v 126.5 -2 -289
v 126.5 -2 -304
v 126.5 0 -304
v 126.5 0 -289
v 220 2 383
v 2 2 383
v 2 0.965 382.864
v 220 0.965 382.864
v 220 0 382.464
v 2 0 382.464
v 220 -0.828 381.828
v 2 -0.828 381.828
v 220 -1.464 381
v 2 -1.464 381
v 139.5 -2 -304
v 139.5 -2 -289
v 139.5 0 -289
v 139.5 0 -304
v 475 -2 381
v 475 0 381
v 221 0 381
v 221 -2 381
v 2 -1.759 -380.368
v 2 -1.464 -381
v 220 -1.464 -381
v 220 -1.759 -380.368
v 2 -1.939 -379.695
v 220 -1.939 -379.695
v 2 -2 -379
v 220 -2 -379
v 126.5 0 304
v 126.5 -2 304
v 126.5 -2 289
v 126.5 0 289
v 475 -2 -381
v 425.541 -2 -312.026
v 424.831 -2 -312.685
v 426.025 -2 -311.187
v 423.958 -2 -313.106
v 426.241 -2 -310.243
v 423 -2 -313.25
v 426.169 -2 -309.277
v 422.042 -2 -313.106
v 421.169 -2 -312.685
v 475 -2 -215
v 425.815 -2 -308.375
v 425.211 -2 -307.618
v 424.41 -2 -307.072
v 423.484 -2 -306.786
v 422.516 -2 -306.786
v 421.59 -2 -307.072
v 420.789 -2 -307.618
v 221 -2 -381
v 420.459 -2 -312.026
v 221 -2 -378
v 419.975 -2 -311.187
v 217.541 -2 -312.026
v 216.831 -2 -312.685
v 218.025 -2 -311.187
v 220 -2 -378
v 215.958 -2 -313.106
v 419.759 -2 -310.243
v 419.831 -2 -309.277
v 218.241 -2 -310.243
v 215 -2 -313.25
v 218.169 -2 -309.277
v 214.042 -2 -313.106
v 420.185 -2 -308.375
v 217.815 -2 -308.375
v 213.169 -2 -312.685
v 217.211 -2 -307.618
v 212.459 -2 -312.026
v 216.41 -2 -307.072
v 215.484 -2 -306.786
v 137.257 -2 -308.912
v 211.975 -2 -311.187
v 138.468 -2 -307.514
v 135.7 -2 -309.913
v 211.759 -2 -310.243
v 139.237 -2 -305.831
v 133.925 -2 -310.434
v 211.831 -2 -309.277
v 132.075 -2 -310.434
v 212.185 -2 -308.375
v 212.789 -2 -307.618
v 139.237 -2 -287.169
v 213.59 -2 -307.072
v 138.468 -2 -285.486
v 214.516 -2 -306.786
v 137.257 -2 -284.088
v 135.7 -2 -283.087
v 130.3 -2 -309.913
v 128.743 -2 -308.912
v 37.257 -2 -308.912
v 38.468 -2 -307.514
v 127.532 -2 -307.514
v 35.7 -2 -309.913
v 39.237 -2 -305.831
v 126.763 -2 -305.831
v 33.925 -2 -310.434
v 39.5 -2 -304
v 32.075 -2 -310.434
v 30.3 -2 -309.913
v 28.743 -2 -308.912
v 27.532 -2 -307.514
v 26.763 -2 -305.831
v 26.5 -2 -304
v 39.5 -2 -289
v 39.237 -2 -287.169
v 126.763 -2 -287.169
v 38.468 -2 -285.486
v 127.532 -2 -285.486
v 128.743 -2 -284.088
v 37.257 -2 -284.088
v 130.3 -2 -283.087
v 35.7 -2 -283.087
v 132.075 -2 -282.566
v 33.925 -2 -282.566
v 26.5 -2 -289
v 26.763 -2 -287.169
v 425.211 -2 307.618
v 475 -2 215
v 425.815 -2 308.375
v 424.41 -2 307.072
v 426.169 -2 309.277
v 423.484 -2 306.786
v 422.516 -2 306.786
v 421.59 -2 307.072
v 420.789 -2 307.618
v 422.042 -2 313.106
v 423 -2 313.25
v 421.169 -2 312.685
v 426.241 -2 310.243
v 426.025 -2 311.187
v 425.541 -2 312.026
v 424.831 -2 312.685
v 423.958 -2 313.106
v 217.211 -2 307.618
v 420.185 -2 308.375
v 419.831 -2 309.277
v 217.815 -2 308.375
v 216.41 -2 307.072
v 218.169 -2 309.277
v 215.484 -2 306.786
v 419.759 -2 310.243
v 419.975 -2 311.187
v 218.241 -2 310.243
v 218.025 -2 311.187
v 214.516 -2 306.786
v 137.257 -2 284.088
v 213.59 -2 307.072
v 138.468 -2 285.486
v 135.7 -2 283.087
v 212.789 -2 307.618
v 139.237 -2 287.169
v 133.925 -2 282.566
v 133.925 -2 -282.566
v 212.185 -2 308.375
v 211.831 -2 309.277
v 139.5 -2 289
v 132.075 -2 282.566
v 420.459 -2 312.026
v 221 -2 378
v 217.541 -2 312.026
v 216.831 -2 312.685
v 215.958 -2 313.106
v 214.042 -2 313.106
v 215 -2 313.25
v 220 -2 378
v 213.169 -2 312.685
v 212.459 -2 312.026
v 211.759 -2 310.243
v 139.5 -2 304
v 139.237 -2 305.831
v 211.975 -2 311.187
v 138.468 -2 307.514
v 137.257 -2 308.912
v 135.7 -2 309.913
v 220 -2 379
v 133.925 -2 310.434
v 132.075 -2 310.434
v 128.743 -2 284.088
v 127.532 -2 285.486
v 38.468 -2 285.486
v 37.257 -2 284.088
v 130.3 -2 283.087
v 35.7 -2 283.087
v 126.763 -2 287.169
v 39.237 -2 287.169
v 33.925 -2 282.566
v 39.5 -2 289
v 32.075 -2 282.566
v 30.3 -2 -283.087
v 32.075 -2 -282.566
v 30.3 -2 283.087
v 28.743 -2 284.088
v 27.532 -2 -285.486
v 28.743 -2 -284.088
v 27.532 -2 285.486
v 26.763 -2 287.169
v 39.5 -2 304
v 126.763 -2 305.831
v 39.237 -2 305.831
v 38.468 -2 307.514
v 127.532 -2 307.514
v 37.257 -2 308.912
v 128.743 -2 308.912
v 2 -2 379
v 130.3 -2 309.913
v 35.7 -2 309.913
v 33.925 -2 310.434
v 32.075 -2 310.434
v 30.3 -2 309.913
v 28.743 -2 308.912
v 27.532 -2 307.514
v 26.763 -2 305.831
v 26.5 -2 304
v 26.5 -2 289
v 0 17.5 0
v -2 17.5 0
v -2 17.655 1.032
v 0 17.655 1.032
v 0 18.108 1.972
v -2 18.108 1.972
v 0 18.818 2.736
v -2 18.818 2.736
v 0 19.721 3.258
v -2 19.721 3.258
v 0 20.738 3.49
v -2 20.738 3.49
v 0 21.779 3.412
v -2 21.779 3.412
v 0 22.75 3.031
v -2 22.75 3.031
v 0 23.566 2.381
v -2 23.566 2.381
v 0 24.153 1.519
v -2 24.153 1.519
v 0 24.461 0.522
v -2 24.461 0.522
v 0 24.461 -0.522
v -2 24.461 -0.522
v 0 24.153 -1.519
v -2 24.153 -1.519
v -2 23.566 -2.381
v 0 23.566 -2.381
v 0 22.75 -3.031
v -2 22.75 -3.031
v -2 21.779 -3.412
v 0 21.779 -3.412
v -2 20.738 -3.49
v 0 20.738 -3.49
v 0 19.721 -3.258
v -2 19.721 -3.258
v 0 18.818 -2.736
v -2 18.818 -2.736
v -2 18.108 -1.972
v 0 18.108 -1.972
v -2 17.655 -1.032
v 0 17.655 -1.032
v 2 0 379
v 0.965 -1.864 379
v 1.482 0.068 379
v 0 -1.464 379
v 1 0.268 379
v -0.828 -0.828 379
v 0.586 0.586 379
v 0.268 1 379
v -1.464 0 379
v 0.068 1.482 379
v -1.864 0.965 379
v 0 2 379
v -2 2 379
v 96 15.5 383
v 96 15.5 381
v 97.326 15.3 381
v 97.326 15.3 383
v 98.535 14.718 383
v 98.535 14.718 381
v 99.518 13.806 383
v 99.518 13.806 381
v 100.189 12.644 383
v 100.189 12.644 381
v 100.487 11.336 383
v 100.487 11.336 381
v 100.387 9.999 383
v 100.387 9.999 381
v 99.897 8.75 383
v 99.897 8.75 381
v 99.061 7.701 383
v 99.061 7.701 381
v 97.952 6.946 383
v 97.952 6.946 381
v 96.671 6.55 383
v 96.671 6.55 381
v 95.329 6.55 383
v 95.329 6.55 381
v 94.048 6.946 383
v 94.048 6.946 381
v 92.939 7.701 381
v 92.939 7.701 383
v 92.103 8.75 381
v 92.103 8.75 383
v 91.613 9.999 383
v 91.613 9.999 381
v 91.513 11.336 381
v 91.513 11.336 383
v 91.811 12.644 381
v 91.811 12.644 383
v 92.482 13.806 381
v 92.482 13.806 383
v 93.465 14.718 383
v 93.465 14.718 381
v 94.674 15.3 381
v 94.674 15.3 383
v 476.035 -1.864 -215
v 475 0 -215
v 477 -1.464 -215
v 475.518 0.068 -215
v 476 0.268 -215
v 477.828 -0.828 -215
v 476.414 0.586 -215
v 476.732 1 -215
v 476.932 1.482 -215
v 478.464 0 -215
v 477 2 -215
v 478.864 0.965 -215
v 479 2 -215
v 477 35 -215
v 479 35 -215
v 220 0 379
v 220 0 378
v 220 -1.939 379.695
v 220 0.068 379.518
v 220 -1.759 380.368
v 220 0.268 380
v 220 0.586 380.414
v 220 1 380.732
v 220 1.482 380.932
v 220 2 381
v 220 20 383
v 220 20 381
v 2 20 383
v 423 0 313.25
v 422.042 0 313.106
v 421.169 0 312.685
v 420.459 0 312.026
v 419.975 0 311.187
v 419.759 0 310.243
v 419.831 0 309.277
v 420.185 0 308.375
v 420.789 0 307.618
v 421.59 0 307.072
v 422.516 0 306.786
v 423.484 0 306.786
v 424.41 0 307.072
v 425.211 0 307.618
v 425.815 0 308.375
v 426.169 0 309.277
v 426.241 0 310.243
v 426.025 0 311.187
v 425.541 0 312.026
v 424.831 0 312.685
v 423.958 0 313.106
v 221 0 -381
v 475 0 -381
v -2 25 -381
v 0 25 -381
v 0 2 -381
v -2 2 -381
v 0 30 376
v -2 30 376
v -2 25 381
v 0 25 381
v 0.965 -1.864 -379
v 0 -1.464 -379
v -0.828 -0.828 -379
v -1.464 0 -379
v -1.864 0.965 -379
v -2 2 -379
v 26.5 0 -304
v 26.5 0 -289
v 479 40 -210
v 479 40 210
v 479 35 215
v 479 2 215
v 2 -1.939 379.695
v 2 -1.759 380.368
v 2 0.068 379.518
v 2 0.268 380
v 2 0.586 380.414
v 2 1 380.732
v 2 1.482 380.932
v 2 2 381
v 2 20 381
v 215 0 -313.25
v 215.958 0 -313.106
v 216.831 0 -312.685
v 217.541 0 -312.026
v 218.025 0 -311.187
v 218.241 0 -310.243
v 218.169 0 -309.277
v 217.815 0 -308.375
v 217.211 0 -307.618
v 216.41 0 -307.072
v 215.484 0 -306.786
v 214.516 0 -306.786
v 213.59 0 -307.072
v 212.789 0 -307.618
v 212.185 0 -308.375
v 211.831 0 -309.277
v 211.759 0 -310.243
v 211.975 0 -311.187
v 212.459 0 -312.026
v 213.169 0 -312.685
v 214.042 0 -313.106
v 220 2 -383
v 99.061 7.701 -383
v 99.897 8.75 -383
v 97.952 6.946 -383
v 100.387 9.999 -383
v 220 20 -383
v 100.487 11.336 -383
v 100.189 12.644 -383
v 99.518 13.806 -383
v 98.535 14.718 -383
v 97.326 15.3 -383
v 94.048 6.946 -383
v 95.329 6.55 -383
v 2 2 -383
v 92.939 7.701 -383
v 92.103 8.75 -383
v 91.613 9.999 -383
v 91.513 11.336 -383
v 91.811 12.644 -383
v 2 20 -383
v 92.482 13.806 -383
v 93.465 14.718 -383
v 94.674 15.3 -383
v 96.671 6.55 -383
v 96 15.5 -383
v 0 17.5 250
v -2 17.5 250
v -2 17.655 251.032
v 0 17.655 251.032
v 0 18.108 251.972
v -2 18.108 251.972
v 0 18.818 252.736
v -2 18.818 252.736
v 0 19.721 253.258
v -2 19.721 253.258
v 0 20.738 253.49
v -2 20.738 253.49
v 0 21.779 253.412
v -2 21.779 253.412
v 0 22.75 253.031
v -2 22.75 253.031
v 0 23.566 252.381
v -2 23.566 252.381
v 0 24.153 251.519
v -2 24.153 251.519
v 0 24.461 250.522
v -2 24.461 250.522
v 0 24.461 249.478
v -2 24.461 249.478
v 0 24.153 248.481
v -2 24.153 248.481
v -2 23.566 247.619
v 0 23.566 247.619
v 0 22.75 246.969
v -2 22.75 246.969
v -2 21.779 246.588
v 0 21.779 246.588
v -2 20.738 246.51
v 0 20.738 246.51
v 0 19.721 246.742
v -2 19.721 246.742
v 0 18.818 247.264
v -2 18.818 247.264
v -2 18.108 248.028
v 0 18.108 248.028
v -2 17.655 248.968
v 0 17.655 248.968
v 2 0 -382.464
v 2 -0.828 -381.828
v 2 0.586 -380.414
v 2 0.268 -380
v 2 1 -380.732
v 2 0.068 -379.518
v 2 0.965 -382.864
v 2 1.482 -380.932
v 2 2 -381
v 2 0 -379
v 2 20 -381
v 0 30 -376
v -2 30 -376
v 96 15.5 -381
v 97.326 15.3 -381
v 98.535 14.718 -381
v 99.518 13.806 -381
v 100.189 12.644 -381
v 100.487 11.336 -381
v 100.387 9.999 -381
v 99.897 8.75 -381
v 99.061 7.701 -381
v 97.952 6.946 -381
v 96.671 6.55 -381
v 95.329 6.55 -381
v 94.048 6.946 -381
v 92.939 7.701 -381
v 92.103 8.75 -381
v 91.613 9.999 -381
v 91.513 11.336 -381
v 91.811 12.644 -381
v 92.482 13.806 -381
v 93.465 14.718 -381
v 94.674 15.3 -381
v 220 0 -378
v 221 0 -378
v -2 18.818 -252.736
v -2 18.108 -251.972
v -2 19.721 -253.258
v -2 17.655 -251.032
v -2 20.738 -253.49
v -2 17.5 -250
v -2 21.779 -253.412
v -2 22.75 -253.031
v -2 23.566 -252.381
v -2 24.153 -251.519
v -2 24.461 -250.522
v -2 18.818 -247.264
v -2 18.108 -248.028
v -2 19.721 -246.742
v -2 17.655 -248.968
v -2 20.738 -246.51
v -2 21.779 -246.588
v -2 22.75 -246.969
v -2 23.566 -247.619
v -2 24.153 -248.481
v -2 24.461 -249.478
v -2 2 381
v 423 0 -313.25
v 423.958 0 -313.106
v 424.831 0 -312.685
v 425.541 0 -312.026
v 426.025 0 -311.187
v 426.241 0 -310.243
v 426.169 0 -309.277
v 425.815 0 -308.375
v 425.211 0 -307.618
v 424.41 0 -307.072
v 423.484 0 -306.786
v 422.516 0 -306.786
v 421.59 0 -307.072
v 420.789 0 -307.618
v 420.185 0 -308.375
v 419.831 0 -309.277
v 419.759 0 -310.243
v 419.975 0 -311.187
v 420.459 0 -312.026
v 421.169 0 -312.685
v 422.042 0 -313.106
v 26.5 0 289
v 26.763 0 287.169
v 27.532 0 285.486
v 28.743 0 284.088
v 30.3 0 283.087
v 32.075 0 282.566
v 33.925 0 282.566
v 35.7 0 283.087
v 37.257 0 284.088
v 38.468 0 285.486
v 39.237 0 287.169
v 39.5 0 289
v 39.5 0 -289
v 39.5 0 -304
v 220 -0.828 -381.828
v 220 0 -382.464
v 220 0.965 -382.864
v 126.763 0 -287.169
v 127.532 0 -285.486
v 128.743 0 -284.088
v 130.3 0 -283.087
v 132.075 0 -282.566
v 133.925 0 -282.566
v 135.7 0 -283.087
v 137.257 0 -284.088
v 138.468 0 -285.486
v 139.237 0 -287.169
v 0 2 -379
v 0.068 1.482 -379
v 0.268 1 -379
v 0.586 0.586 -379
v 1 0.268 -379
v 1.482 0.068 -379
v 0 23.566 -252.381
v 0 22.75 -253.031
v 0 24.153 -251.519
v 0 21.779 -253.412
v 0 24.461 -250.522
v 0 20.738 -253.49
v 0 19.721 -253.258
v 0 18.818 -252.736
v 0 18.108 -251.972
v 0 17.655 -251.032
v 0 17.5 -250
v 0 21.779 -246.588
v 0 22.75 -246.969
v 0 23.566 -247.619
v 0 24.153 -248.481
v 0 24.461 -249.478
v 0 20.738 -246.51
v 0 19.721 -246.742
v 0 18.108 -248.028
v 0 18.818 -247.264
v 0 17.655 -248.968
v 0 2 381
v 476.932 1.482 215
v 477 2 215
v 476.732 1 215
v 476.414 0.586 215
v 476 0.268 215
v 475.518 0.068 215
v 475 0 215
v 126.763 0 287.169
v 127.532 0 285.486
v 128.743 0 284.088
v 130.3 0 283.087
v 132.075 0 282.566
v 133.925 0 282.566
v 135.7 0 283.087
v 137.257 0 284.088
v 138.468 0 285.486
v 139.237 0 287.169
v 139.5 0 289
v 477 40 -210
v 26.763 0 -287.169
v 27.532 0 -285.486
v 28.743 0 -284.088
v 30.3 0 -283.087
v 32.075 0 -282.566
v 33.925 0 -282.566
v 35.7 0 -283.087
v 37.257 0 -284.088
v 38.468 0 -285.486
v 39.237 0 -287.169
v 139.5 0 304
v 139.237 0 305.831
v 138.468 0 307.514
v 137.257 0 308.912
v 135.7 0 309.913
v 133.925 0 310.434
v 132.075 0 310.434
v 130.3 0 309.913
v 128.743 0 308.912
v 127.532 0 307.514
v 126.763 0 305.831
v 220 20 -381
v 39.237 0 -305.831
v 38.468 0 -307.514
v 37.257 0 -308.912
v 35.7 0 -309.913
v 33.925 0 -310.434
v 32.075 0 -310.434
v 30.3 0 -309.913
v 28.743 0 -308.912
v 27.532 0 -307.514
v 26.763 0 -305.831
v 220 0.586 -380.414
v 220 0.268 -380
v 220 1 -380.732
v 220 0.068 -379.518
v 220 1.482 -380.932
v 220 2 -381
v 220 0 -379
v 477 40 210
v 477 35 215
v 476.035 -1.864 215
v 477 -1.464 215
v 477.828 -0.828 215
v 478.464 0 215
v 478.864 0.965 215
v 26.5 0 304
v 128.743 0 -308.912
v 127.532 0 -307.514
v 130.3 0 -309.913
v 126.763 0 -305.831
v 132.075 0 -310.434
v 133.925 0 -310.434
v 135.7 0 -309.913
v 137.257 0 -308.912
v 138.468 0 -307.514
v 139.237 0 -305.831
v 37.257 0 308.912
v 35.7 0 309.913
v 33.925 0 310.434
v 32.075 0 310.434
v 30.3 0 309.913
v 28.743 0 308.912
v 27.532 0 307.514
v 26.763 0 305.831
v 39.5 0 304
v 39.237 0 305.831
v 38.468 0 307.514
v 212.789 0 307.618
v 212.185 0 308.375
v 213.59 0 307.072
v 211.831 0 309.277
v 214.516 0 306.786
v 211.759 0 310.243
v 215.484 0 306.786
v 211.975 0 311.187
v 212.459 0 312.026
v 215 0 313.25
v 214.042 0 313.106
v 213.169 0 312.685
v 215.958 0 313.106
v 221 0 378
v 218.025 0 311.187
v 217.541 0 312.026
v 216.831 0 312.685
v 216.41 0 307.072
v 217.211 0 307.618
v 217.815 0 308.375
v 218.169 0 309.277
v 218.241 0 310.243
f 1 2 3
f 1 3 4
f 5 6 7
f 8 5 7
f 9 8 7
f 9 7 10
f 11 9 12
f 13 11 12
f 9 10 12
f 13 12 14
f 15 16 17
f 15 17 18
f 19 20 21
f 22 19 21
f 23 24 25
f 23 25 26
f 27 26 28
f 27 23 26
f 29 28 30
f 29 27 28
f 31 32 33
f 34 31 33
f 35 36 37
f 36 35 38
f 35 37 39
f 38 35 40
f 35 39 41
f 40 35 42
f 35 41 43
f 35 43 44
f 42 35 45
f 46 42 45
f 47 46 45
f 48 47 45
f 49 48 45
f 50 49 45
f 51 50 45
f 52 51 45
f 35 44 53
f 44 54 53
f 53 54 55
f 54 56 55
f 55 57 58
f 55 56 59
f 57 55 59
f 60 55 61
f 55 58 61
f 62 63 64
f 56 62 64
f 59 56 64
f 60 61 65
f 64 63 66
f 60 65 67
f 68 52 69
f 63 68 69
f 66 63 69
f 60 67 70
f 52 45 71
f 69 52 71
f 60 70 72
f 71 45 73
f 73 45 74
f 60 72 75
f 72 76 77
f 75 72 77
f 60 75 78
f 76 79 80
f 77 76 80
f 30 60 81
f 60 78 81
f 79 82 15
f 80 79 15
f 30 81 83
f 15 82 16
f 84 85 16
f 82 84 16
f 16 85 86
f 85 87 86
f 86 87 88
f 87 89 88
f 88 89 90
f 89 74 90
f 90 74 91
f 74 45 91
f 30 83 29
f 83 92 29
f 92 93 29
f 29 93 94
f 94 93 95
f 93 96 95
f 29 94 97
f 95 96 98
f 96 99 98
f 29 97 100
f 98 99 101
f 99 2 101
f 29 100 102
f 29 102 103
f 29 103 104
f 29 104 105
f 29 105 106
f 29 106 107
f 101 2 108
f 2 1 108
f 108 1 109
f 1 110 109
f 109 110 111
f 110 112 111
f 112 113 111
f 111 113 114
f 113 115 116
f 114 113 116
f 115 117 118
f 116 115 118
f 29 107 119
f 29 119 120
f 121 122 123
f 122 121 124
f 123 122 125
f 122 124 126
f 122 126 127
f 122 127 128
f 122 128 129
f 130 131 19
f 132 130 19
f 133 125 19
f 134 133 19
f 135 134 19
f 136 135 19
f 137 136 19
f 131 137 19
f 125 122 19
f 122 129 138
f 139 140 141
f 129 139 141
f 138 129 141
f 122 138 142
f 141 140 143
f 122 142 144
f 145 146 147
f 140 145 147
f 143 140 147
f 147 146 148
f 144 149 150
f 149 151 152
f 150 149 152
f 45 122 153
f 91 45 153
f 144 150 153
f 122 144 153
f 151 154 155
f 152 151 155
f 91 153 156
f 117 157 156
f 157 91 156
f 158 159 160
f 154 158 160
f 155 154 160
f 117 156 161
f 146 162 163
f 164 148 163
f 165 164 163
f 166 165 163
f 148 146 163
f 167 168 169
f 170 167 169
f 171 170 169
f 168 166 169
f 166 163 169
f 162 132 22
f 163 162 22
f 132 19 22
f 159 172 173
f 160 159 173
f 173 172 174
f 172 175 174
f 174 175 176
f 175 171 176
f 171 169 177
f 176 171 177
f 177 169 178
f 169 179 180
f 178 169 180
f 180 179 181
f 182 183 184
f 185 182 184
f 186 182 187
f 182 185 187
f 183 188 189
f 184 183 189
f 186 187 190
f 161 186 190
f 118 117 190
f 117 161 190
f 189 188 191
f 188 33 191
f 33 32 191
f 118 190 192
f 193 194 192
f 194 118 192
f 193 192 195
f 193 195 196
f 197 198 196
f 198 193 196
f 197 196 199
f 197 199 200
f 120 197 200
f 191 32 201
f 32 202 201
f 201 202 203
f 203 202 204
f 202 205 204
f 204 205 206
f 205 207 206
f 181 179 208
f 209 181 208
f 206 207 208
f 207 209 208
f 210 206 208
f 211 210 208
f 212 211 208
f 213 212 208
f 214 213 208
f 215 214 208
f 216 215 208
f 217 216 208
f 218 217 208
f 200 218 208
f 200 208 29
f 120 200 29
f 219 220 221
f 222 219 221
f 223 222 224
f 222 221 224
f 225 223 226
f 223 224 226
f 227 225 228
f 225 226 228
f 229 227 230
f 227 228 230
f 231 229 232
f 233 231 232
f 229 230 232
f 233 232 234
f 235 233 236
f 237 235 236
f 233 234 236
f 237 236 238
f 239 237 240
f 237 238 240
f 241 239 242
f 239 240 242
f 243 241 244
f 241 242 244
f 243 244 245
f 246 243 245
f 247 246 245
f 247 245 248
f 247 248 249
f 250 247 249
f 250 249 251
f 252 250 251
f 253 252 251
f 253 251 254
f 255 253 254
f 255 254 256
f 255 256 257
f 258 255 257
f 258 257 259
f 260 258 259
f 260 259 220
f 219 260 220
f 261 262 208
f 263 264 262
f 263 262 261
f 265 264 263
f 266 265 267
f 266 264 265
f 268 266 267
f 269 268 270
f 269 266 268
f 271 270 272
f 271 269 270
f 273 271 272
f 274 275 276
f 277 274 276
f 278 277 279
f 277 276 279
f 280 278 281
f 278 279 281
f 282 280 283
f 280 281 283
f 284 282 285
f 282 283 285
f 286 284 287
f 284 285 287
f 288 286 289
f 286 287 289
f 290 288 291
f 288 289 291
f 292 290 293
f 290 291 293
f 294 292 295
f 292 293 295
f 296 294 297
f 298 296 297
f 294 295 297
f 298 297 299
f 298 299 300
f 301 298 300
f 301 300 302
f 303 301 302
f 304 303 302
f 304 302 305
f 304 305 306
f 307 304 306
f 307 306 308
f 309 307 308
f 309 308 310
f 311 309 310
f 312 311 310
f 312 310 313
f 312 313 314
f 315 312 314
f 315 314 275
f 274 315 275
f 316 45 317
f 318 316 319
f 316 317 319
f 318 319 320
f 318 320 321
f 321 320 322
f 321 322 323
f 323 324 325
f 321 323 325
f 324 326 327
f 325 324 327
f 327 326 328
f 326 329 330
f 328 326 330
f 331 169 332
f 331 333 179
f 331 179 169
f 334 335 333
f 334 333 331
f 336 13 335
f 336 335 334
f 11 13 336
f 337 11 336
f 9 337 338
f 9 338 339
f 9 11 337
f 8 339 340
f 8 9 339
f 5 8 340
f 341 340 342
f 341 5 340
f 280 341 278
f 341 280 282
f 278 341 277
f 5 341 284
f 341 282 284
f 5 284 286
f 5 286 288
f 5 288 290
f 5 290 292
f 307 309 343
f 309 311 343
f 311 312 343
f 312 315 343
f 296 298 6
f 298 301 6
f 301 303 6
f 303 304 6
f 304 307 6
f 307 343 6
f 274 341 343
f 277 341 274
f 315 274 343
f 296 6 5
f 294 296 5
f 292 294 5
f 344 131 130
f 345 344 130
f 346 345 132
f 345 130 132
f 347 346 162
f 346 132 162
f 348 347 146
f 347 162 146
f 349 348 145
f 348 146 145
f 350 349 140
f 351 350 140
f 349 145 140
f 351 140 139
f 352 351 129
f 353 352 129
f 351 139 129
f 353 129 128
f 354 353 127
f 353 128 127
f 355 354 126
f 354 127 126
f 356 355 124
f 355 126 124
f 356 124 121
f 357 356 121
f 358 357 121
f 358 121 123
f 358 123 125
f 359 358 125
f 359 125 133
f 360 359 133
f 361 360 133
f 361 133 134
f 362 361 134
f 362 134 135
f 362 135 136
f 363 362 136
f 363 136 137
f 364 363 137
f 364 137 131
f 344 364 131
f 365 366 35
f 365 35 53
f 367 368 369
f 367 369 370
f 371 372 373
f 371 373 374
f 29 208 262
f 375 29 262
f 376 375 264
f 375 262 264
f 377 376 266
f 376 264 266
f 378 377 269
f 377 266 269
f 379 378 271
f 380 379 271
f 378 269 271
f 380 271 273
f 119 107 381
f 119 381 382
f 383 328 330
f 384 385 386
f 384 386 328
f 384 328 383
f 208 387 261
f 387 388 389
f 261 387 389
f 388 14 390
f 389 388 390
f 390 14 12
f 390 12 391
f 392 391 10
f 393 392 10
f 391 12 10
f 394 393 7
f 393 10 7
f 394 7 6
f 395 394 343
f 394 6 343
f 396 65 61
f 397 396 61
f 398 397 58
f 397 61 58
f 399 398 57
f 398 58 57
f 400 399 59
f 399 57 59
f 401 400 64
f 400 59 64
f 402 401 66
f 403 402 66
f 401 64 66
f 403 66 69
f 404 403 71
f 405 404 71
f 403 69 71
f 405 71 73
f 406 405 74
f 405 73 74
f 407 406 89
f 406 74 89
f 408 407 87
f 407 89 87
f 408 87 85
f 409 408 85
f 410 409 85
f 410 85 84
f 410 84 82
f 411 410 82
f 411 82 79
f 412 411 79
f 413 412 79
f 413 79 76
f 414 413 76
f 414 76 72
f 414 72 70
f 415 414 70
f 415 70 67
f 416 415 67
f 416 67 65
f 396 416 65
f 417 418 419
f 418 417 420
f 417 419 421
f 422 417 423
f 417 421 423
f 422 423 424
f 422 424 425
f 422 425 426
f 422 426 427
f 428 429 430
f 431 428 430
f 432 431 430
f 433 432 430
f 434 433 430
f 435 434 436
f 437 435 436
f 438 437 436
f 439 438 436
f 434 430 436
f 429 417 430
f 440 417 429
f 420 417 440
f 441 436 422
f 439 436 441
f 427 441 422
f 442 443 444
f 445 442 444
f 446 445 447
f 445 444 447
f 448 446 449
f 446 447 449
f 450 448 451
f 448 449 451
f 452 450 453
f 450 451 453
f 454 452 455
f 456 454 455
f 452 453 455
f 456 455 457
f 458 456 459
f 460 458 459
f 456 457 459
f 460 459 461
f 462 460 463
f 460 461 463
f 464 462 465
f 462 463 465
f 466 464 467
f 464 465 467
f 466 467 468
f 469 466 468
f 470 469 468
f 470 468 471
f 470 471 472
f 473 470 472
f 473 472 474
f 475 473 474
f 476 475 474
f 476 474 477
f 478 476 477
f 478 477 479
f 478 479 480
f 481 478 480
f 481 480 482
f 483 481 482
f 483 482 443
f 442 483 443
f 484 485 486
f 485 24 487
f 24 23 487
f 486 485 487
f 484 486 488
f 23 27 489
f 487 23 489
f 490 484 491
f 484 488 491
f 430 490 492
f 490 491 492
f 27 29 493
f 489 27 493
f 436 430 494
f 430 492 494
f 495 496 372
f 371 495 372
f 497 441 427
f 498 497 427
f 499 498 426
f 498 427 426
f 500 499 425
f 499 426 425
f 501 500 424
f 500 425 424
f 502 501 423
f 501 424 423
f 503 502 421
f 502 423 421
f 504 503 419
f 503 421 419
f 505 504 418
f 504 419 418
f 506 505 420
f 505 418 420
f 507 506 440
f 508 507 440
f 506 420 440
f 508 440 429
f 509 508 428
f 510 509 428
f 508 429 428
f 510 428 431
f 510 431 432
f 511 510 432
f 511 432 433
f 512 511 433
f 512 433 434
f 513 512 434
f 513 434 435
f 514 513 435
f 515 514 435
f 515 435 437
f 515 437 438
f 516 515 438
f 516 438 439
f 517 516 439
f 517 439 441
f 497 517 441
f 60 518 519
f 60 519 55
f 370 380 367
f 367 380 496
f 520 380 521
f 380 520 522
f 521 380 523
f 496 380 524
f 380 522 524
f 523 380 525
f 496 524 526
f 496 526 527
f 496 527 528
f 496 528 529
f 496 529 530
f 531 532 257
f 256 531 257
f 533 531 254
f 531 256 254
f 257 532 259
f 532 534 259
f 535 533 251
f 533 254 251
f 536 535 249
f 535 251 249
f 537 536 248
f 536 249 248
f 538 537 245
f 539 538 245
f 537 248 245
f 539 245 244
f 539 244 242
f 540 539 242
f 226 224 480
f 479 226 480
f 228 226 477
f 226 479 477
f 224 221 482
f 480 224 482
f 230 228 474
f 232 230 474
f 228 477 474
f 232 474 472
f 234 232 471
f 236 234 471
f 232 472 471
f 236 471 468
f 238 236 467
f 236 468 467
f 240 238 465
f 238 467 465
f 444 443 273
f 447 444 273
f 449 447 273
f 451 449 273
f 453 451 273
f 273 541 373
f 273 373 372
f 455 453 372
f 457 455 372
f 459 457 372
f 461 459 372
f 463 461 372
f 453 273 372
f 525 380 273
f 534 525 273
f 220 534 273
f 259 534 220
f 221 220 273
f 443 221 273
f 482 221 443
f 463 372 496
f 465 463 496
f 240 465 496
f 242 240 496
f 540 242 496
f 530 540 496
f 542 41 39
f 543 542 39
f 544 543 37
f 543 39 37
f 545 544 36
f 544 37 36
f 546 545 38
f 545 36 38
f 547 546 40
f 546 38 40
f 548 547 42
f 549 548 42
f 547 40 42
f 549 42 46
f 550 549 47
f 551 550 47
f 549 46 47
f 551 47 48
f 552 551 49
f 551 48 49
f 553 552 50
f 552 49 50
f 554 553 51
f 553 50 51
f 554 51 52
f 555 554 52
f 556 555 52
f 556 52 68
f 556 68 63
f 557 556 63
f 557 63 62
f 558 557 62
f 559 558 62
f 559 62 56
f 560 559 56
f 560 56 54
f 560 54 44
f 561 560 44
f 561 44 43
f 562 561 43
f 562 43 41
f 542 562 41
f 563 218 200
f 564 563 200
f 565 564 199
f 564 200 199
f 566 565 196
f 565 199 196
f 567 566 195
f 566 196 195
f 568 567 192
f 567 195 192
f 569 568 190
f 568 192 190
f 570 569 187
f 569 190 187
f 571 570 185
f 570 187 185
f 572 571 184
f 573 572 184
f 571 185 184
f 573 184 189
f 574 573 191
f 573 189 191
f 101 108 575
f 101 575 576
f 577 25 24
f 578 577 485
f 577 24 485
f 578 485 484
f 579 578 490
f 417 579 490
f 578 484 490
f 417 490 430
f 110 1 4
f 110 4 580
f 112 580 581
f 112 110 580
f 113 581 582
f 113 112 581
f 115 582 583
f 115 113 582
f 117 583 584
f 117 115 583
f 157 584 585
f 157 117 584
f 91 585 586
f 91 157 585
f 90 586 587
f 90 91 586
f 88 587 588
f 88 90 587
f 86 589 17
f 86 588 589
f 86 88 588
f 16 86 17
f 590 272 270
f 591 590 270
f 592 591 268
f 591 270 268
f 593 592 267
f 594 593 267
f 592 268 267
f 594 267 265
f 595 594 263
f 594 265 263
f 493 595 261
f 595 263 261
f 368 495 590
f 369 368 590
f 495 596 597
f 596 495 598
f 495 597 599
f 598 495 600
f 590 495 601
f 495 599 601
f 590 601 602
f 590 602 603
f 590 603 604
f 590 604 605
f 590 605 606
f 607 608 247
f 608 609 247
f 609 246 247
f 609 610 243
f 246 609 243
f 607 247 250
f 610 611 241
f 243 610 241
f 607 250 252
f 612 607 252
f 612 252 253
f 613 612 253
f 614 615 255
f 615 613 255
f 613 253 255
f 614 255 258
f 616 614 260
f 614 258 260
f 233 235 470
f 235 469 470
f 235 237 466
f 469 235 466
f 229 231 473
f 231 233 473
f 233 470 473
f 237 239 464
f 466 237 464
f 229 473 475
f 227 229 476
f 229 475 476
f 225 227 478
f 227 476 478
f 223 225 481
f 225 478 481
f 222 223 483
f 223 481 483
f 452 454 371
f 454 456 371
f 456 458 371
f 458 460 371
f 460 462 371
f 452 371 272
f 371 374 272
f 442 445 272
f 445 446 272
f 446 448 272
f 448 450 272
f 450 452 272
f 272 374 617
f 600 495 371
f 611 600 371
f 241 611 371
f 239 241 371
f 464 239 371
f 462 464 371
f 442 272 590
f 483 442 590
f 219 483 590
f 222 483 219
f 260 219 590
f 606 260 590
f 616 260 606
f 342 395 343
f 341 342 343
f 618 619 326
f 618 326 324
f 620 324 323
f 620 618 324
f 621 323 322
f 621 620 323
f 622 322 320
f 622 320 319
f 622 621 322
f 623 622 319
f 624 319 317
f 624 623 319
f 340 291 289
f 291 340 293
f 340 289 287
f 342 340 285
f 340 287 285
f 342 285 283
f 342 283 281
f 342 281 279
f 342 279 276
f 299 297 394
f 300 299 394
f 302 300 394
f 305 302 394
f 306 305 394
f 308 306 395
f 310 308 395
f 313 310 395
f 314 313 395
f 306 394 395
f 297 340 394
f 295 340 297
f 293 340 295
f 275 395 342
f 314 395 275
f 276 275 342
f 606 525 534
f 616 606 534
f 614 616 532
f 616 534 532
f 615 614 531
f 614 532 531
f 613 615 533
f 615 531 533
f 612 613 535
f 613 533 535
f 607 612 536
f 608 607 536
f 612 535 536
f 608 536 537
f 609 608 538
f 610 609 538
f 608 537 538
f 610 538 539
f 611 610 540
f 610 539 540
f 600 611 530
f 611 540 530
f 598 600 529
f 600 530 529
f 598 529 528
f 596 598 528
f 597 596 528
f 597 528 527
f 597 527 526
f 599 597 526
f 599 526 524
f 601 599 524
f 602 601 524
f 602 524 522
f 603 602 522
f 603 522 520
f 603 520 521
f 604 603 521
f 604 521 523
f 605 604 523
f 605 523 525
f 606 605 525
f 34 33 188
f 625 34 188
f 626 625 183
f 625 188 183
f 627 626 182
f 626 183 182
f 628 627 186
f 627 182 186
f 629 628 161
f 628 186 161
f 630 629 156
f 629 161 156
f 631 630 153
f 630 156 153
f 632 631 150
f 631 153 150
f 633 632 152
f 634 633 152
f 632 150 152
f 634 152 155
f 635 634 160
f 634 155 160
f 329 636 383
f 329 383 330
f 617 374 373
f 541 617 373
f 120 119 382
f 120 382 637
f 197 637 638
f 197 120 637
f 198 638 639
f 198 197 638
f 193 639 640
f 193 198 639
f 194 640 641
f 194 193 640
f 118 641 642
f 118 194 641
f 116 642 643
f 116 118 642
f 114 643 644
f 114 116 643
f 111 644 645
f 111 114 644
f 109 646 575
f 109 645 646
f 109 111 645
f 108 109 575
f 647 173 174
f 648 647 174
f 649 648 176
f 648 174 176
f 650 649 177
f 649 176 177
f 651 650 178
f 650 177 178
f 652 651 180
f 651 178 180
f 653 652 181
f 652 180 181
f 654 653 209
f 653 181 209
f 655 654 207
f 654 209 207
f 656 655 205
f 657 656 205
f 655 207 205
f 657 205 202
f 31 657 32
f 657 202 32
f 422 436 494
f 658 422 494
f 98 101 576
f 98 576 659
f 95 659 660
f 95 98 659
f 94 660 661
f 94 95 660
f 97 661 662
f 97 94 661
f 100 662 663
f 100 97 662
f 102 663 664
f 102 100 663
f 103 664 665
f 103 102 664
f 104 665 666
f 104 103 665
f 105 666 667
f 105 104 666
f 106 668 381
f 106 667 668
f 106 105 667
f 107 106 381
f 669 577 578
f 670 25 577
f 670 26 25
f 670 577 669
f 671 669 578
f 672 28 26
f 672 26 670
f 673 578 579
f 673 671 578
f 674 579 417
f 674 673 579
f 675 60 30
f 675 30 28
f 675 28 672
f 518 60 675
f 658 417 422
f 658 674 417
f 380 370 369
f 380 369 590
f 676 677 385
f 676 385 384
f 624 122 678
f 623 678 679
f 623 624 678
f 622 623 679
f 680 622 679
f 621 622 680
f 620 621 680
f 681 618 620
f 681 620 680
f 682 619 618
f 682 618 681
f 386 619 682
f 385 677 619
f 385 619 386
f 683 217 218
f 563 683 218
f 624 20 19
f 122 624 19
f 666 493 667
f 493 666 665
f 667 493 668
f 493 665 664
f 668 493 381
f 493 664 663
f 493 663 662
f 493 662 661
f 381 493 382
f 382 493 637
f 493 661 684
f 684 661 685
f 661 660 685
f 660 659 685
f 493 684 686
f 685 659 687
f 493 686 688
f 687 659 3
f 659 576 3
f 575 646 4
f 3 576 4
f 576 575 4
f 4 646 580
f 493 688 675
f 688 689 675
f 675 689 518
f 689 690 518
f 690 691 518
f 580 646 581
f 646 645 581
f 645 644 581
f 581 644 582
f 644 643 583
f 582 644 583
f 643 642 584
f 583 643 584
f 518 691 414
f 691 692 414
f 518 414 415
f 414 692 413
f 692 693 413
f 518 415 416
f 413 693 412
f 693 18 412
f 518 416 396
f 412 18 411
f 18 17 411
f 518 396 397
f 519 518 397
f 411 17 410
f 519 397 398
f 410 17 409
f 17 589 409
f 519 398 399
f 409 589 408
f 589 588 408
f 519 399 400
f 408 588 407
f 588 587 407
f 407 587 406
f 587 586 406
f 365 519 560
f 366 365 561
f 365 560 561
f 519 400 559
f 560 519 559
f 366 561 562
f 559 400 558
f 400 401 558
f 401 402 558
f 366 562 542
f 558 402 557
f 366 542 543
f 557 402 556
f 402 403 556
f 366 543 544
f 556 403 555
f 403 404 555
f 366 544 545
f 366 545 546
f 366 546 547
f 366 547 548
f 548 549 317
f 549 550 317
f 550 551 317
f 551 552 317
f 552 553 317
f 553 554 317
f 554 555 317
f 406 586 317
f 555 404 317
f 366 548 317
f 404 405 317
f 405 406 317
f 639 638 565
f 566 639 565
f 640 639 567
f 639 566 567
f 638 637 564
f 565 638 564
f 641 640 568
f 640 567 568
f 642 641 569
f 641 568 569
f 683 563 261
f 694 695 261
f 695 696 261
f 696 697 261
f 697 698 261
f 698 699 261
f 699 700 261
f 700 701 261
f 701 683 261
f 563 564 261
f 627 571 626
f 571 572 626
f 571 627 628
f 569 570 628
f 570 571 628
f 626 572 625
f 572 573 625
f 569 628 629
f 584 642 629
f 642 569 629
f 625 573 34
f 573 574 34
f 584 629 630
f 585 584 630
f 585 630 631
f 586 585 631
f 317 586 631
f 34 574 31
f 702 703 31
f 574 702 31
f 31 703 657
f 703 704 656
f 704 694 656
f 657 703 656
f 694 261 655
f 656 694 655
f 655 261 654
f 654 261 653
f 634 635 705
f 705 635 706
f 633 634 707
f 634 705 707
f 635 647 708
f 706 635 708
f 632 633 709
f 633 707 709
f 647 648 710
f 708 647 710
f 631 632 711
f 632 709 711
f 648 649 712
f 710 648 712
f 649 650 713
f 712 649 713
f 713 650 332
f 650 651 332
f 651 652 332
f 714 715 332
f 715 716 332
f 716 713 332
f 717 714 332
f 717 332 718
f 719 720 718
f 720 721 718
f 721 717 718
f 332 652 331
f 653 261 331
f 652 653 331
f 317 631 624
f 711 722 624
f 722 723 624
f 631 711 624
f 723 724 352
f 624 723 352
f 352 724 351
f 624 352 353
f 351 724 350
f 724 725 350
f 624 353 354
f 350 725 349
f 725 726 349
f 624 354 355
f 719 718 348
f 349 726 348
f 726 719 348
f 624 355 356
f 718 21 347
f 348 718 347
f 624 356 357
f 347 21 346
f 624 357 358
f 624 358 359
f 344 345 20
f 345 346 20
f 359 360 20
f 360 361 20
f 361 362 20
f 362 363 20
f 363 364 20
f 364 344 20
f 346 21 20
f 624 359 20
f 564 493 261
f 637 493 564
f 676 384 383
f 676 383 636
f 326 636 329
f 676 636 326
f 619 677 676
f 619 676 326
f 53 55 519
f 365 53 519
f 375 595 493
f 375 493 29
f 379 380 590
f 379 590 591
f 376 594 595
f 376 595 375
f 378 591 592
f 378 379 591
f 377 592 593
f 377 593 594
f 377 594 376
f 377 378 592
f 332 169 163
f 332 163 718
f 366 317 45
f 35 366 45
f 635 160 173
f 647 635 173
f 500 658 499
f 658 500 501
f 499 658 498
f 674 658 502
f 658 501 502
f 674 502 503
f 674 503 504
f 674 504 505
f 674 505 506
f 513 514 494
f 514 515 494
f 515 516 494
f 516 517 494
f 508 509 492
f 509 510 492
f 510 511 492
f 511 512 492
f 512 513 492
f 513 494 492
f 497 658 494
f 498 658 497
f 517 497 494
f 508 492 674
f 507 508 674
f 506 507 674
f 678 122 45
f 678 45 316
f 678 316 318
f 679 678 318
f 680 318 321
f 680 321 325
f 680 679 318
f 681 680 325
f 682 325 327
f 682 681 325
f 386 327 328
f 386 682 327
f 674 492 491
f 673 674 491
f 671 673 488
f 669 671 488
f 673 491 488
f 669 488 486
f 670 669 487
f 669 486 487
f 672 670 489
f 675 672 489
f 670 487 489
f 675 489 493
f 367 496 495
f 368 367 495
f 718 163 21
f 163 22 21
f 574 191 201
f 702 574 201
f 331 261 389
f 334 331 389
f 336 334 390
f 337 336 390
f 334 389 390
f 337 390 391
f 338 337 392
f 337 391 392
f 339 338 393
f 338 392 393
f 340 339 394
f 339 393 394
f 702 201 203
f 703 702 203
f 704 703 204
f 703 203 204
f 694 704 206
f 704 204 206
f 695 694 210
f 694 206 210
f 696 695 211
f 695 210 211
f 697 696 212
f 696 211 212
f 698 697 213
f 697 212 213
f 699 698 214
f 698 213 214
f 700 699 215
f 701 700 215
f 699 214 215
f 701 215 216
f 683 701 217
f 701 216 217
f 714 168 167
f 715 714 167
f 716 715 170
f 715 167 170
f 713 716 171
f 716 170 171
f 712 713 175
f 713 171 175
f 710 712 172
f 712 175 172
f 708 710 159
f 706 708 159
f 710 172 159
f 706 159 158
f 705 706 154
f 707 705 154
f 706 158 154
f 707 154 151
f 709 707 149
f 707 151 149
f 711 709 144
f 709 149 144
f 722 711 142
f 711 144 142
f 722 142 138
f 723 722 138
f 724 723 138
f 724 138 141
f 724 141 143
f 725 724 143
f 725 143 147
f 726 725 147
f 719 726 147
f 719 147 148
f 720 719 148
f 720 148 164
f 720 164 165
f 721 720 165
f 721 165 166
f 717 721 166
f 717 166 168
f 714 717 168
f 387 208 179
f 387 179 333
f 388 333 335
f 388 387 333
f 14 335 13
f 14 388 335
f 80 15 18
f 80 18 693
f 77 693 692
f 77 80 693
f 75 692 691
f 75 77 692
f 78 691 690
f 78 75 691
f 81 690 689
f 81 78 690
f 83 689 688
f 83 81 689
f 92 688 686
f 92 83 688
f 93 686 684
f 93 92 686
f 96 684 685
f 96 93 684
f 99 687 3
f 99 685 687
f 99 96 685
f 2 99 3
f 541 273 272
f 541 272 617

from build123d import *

# Parameters (mm, degrees)
SM_BASE_FLANGE_1_DEPTH   = 381
SKETCH_6_R               = 3.5
CUT_EXTRUDE_1_DEPTH      = 10
SKETCH_7_R               = 3.25
CUT_EXTRUDE_2_DEPTH      = 10
SM_EDGE_FLANGE_2_DEPTH   = 430
OTHER_START              = -2
OTHER_1_DEPTH            = 2
OTHER_START_2            = 477
OTHER_1_2_DEPTH          = 2
SM_START                 = -2
SM_EDGE_FLANGE_4_DEPTH   = 223
SM_EDGE_FLANGE_4_2_DEPTH = 4
SM_START_2               = 220
SM_EDGE_FLANGE_4_3_DEPTH = 1
SM_START_3               = 2
SM_EDGE_FLANGE_4_4_DEPTH = 218
SKETCH_26_R              = 4.5
CUT_EXTRUDE_3_DEPTH      = 905.321292462
SKETCH_28_W              = 762
SKETCH_28_H              = 10
CUT_EXTRUDE_4_DEPTH      = 10
CHAMFER_1_SIZE           = 5


# Read off the part's stored shape, not the designer's step: Затупленный угол1, Ребро-кромка4
# Sheet-metal steps are written as plain solids
with BuildPart() as part:
    # Sketch 1 → Базовая кромка1 (new, symmetric)
    with BuildSketch(Plane.XY):
        with BuildLine():
            Line((0, 40), (0, 2))
            ThreePointArc((0, 2), (0.585786438, 0.585786438), (2, 0))
            Line((2, 0), (475, 0))
            Line((475, 0), (475, -2))
            Line((475, -2), (2, -2))
            ThreePointArc((2, -2), (-0.828427125, -0.828427125), (-2, 2))
            Line((-2, 2), (-2, 40))
            Line((-2, 40), (0, 40))
        make_face()
    extrude(amount=SM_BASE_FLANGE_1_DEPTH, both=True)

    # Эскиз6 → Вырез-Вытянуть1 (cut)
    with BuildSketch(Plane.ZY.offset(2)):
        with Locations(Location((-250, 21, 0), (0, 0, 270))):
            Circle(SKETCH_6_R)
        with Locations(Location((0, 21, 0), (0, 0, 270))):
            Circle(SKETCH_6_R)
        with Locations(Location((250, 21, 0), (0, 0, 270))):
            Circle(SKETCH_6_R)
    extrude(amount=-CUT_EXTRUDE_1_DEPTH, mode=Mode.SUBTRACT)

    # Эскиз7 → Вырез-Вытянуть2 (cut)
    with BuildSketch(Plane.XZ.offset(2)):
        with Locations(Location((215, -310, 0), (0, 0, 270))):
            Circle(SKETCH_7_R)
        with Locations(Location((215, 310, 0), (0, 0, 90))):
            Circle(SKETCH_7_R)
        with Locations(Location((423, -310, 0), (0, 0, 270))):
            Circle(SKETCH_7_R)
        with Locations(Location((423, 310, 0), (0, 0, 90))):
            Circle(SKETCH_7_R)
        with BuildLine():
            Line((26.5, -304), (26.5, -289))
            ThreePointArc((26.5, -289), (33, -282.5), (39.5, -289))
            Line((39.5, -289), (39.5, -304))
            ThreePointArc((39.5, -304), (33, -310.5), (26.5, -304))
        make_face()
        with BuildLine():
            Line((139.5, -289), (139.5, -304))
            ThreePointArc((139.5, -304), (133, -310.5), (126.5, -304))
            Line((126.5, -304), (126.5, -289))
            ThreePointArc((126.5, -289), (133, -282.5), (139.5, -289))
        make_face()
        with BuildLine():
            Line((26.5, 304), (26.5, 289))
            ThreePointArc((26.5, 289), (33, 282.5), (39.5, 289))
            Line((39.5, 289), (39.5, 304))
            ThreePointArc((39.5, 304), (33, 310.5), (26.5, 304))
        make_face()
        with BuildLine():
            Line((139.5, 289), (139.5, 304))
            ThreePointArc((139.5, 304), (133, 310.5), (126.5, 304))
            Line((126.5, 304), (126.5, 289))
            ThreePointArc((126.5, 289), (133, 282.5), (139.5, 289))
        make_face()
    extrude(amount=-CUT_EXTRUDE_2_DEPTH, mode=Mode.SUBTRACT)

    # Ребро-кромка2 section (across the edge) → Ребро-кромка2 (add)
    with BuildSketch(Plane(origin=(477, 0, 215), x_dir=(-1, 0, 0), z_dir=(0, 0, -1))):
        with BuildLine():
            Line((-2, 2), (-2, 40))
            Line((-2, 40), (0, 40))
            Line((0, 40), (0, 2))
            ThreePointArc((0, 2), (0.585786438, 0.585786438), (2, 0))
            Line((2, 0), (2, -2))
            ThreePointArc((2, -2), (-0.828427125, -0.828427125), (-2, 2))
        make_face()
    extrude(amount=SM_EDGE_FLANGE_2_DEPTH)

    # Other 1 outline → Other 1 (cut)
    with BuildSketch(Plane.YZ.offset(OTHER_START)):
        Polygon((40, -381), (40, -376), (35, -381), align=None)
        Polygon((35, 381), (40, 376), (40, 381), align=None)
    extrude(amount=OTHER_1_DEPTH, mode=Mode.SUBTRACT)

    # Other 1 2 outline → Other 1 2 (cut)
    with BuildSketch(Plane.YZ.offset(OTHER_START_2)):
        Polygon((35, 215), (40, 210), (40, 215), align=None)
        Polygon((35, -215), (40, -215), (40, -210), align=None)
    extrude(amount=OTHER_1_2_DEPTH, mode=Mode.SUBTRACT)

    # Ребро-кромка4 outline → Ребро-кромка4 (cut)
    with BuildSketch(Plane.YZ.offset(SM_START)):
        with BuildLine():
            ThreePointArc((0, -379), (0.585786438, -380.414213562), (2, -381))
            Line((2, -381), (2, -379))
            Line((2, -379), (0, -379))
        make_face()
        with BuildLine():
            ThreePointArc((-1.464101616, -381), (-1.863703305, -380.03527618), (-2, -379))
            Line((-2, -379), (-2, -381))
            Line((-2, -381), (-1.464101616, -381))
        make_face()
        with BuildLine():
            ThreePointArc((2, 381), (0.585786438, 380.414213562), (0, 379))
            Line((0, 379), (2, 379))
            Line((2, 379), (2, 381))
        make_face()
        with BuildLine():
            Line((-2, 381), (-2, 379))
            ThreePointArc((-2, 379), (-1.863703305, 380.03527618), (-1.464101616, 381))
            Line((-1.464101616, 381), (-2, 381))
        make_face()
    extrude(amount=SM_EDGE_FLANGE_4_DEPTH, mode=Mode.SUBTRACT)

    # Sm Edge Flange 4 2 outline → Sm Edge Flange 4 2 (cut)
    with BuildSketch(Plane.YZ.offset(SM_START)):
        with BuildLine():
            ThreePointArc((2, -381), (0.585786438, -380.414213562), (0, -379))
            Line((0, -379), (-2, -379))
            ThreePointArc((-2, -379), (-1.863703305, -380.03527618), (-1.464101616, -381))
            Line((-1.464101616, -381), (2, -381))
        make_face()
        with BuildLine():
            Line((2, 381), (-1.464101616, 381))
            ThreePointArc((-1.464101616, 381), (-1.863703305, 380.03527618), (-2, 379))
            Line((-2, 379), (0, 379))
            ThreePointArc((0, 379), (0.585786438, 380.414213562), (2, 381))
        make_face()
    extrude(amount=SM_EDGE_FLANGE_4_2_DEPTH, mode=Mode.SUBTRACT)

    # Sm Edge Flange 4 3 outline → Sm Edge Flange 4 3 (cut)
    with BuildSketch(Plane.YZ.offset(SM_START_2)):
        with BuildLine():
            Line((0, -381), (0, -378))
            Line((0, -378), (-2, -378))
            Line((-2, -378), (-2, -379))
            ThreePointArc((-2, -379), (-1.863703305, -380.03527618), (-1.464101616, -381))
            Line((-1.464101616, -381), (0, -381))
        make_face()
        with BuildLine():
            Line((-2, 378), (0, 378))
            Line((0, 378), (0, 381))
            Line((0, 381), (-1.464101616, 381))
            ThreePointArc((-1.464101616, 381), (-1.863703305, 380.03527618), (-2, 379))
            Line((-2, 379), (-2, 378))
        make_face()
    extrude(amount=SM_EDGE_FLANGE_4_3_DEPTH, mode=Mode.SUBTRACT)

    # Sm Edge Flange 4 4 outline → Sm Edge Flange 4 4 (add)
    with BuildSketch(Plane.YZ.offset(SM_START_3)):
        with BuildLine():
            Line((0, -379), (0, -381))
            Line((0, -381), (-1.464101616, -381))
            ThreePointArc((-1.464101616, -381), (0, -382.464101615), (2, -383))
            Line((2, -383), (20, -383))
            Line((20, -383), (20, -381))
            Line((20, -381), (2, -381))
            ThreePointArc((2, -381), (0.585786438, -380.414213562), (0, -379))
        make_face()
        with BuildLine():
            Line((0, 381), (0, 379))
            ThreePointArc((0, 379), (0.585786438, 380.414213562), (2, 381))
            Line((2, 381), (20, 381))
            Line((20, 381), (20, 383))
            Line((20, 383), (2, 383))
            ThreePointArc((2, 383), (0, 382.464101615), (-1.464101616, 381))
            Line((-1.464101616, 381), (0, 381))
        make_face()
    extrude(amount=SM_EDGE_FLANGE_4_4_DEPTH)

    # Эскиз26 → Вырез-Вытянуть3 (cut, through all)
    with BuildSketch(Plane(origin=(0, 0, -383), x_dir=(-1, 0, 0), z_dir=(0, 0, -1))):
        with Locations(Location((-96, 11, 0), (0, 0, 90))):
            Circle(SKETCH_26_R)
    extrude(amount=-CUT_EXTRUDE_3_DEPTH, mode=Mode.SUBTRACT)

    # Эскиз28 → Вырез-Вытянуть4 (cut)
    with BuildSketch(Plane.ZY.offset(2)):
        with Locations((0, 35)):
            Rectangle(SKETCH_28_W, SKETCH_28_H)
    extrude(amount=-CUT_EXTRUDE_4_DEPTH, mode=Mode.SUBTRACT)

    # Фаска1
    chamfer_1_edges = [part.edges().sort_by_distance(p)[0] for p in [
        (-1, 30, 381),
        (-1, 30, -381),
    ]]
    chamfer(chamfer_1_edges, length=CHAMFER_1_SIZE)


solid = part.part
